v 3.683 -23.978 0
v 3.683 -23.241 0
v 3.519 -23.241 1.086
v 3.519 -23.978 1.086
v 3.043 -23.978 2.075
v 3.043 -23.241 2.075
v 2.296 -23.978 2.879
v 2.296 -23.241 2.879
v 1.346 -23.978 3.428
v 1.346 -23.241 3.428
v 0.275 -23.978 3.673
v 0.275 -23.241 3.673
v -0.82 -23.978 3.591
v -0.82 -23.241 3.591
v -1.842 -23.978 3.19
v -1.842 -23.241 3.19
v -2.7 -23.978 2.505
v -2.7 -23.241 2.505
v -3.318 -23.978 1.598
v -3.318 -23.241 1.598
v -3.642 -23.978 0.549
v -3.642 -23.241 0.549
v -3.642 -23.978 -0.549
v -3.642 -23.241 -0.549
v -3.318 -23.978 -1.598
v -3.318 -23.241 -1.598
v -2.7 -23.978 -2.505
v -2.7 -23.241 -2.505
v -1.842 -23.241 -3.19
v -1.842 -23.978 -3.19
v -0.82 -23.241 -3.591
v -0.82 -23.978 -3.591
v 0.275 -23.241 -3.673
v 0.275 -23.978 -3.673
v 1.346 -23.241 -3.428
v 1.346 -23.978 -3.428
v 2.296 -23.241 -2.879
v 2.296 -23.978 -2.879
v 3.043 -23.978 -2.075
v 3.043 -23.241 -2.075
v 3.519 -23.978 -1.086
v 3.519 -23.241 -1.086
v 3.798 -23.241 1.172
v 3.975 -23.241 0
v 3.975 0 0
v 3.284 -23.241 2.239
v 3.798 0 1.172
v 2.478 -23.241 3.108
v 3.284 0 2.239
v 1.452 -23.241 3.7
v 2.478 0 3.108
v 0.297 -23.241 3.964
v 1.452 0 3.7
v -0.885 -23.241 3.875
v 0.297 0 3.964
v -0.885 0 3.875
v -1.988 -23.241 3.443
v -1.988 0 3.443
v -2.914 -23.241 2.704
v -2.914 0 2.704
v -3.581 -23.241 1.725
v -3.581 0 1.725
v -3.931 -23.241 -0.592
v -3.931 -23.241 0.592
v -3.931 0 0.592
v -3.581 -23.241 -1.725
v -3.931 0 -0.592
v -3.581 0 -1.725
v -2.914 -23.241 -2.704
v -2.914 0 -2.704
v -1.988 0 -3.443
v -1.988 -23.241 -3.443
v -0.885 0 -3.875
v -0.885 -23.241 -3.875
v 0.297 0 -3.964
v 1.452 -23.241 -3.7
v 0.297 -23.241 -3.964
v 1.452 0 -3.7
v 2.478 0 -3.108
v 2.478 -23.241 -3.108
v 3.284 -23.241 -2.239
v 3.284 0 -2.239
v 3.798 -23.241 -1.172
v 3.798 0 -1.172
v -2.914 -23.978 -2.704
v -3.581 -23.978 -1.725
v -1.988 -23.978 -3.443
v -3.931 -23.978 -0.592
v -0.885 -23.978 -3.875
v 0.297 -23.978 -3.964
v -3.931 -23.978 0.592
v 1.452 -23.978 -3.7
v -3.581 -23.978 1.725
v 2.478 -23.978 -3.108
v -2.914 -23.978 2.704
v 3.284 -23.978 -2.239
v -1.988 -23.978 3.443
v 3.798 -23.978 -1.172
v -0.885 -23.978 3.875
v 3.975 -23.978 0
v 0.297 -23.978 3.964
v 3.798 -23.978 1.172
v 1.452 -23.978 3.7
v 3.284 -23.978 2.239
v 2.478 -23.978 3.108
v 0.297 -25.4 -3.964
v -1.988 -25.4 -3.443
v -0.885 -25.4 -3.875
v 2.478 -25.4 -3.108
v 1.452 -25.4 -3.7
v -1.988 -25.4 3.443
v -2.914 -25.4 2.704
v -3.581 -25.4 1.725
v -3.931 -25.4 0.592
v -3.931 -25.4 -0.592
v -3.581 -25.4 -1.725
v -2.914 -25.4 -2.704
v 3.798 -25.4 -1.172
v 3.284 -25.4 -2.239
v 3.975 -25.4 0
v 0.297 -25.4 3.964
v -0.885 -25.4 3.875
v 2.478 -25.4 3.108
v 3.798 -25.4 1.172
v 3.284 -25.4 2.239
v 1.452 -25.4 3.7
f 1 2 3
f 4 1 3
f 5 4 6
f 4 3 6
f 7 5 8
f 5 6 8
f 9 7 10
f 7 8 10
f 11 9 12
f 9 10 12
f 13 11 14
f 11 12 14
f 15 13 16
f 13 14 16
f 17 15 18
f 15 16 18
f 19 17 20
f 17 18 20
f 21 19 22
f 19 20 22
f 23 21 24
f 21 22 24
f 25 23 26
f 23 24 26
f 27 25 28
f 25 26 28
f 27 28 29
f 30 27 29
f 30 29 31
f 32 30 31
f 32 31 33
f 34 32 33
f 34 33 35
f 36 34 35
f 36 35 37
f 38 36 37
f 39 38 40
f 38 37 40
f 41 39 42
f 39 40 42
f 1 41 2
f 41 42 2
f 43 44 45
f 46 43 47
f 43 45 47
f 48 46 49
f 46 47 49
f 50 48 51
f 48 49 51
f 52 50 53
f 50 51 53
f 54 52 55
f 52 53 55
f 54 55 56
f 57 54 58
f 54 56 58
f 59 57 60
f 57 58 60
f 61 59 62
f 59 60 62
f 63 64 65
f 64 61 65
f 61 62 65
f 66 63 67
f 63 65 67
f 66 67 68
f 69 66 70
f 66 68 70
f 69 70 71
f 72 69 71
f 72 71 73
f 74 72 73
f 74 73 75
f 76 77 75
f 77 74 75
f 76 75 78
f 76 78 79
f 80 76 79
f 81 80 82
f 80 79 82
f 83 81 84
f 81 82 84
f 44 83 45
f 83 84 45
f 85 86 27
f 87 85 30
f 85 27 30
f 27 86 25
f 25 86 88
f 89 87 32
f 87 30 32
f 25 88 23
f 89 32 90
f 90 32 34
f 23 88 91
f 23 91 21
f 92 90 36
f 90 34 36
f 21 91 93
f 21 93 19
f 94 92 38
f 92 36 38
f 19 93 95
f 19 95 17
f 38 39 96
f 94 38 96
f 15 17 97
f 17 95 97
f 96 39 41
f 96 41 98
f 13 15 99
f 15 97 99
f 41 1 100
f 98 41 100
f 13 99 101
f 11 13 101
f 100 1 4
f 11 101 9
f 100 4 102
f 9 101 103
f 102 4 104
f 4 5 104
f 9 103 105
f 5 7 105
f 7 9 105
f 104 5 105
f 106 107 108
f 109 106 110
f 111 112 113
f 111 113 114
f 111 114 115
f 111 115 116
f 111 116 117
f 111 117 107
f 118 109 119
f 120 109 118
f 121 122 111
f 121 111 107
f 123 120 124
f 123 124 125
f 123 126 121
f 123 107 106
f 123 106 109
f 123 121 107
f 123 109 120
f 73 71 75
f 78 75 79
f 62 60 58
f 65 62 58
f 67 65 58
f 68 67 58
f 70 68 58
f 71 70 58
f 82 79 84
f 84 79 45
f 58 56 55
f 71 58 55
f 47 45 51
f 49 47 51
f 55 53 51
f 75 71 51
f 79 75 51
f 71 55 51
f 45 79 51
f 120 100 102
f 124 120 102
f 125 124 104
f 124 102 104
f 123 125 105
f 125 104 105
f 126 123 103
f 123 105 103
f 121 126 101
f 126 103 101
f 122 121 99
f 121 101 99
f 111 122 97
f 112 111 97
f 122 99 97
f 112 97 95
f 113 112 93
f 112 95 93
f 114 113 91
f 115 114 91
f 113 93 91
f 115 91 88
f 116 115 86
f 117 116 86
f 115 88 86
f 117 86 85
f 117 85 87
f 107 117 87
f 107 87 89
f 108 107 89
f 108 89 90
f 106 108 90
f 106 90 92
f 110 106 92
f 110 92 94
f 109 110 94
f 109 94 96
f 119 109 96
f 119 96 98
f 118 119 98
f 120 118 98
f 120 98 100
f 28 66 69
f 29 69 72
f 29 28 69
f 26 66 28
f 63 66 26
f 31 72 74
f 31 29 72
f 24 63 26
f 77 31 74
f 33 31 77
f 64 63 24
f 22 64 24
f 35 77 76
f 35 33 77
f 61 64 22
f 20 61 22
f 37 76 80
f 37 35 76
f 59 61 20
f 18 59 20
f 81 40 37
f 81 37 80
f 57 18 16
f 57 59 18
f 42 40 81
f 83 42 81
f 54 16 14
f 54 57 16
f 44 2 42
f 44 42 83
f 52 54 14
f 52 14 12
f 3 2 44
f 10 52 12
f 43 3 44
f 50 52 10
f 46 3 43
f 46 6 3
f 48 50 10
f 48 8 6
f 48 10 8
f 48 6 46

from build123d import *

# Parameters (mm, degrees)
F0_R     = 3.9751
F1_DEPTH = 25.4
F3_R     = 7.385751
F3_R_2   = 3.683
F4_DEPTH = 0.7366


with BuildPart() as f1:
    # F0 (on Front) → F1 (new body)
    with BuildSketch(Plane.XZ):
        Circle(F0_R)
    extrude(amount=F1_DEPTH)

    # F3 (on offset) → F4 (cut)
    with BuildSketch(Plane.XZ.offset(23.241)):
        Circle(F3_R)
        Circle(F3_R_2, mode=Mode.SUBTRACT)
    extrude(amount=F4_DEPTH, mode=Mode.SUBTRACT)


solid = f1.part
